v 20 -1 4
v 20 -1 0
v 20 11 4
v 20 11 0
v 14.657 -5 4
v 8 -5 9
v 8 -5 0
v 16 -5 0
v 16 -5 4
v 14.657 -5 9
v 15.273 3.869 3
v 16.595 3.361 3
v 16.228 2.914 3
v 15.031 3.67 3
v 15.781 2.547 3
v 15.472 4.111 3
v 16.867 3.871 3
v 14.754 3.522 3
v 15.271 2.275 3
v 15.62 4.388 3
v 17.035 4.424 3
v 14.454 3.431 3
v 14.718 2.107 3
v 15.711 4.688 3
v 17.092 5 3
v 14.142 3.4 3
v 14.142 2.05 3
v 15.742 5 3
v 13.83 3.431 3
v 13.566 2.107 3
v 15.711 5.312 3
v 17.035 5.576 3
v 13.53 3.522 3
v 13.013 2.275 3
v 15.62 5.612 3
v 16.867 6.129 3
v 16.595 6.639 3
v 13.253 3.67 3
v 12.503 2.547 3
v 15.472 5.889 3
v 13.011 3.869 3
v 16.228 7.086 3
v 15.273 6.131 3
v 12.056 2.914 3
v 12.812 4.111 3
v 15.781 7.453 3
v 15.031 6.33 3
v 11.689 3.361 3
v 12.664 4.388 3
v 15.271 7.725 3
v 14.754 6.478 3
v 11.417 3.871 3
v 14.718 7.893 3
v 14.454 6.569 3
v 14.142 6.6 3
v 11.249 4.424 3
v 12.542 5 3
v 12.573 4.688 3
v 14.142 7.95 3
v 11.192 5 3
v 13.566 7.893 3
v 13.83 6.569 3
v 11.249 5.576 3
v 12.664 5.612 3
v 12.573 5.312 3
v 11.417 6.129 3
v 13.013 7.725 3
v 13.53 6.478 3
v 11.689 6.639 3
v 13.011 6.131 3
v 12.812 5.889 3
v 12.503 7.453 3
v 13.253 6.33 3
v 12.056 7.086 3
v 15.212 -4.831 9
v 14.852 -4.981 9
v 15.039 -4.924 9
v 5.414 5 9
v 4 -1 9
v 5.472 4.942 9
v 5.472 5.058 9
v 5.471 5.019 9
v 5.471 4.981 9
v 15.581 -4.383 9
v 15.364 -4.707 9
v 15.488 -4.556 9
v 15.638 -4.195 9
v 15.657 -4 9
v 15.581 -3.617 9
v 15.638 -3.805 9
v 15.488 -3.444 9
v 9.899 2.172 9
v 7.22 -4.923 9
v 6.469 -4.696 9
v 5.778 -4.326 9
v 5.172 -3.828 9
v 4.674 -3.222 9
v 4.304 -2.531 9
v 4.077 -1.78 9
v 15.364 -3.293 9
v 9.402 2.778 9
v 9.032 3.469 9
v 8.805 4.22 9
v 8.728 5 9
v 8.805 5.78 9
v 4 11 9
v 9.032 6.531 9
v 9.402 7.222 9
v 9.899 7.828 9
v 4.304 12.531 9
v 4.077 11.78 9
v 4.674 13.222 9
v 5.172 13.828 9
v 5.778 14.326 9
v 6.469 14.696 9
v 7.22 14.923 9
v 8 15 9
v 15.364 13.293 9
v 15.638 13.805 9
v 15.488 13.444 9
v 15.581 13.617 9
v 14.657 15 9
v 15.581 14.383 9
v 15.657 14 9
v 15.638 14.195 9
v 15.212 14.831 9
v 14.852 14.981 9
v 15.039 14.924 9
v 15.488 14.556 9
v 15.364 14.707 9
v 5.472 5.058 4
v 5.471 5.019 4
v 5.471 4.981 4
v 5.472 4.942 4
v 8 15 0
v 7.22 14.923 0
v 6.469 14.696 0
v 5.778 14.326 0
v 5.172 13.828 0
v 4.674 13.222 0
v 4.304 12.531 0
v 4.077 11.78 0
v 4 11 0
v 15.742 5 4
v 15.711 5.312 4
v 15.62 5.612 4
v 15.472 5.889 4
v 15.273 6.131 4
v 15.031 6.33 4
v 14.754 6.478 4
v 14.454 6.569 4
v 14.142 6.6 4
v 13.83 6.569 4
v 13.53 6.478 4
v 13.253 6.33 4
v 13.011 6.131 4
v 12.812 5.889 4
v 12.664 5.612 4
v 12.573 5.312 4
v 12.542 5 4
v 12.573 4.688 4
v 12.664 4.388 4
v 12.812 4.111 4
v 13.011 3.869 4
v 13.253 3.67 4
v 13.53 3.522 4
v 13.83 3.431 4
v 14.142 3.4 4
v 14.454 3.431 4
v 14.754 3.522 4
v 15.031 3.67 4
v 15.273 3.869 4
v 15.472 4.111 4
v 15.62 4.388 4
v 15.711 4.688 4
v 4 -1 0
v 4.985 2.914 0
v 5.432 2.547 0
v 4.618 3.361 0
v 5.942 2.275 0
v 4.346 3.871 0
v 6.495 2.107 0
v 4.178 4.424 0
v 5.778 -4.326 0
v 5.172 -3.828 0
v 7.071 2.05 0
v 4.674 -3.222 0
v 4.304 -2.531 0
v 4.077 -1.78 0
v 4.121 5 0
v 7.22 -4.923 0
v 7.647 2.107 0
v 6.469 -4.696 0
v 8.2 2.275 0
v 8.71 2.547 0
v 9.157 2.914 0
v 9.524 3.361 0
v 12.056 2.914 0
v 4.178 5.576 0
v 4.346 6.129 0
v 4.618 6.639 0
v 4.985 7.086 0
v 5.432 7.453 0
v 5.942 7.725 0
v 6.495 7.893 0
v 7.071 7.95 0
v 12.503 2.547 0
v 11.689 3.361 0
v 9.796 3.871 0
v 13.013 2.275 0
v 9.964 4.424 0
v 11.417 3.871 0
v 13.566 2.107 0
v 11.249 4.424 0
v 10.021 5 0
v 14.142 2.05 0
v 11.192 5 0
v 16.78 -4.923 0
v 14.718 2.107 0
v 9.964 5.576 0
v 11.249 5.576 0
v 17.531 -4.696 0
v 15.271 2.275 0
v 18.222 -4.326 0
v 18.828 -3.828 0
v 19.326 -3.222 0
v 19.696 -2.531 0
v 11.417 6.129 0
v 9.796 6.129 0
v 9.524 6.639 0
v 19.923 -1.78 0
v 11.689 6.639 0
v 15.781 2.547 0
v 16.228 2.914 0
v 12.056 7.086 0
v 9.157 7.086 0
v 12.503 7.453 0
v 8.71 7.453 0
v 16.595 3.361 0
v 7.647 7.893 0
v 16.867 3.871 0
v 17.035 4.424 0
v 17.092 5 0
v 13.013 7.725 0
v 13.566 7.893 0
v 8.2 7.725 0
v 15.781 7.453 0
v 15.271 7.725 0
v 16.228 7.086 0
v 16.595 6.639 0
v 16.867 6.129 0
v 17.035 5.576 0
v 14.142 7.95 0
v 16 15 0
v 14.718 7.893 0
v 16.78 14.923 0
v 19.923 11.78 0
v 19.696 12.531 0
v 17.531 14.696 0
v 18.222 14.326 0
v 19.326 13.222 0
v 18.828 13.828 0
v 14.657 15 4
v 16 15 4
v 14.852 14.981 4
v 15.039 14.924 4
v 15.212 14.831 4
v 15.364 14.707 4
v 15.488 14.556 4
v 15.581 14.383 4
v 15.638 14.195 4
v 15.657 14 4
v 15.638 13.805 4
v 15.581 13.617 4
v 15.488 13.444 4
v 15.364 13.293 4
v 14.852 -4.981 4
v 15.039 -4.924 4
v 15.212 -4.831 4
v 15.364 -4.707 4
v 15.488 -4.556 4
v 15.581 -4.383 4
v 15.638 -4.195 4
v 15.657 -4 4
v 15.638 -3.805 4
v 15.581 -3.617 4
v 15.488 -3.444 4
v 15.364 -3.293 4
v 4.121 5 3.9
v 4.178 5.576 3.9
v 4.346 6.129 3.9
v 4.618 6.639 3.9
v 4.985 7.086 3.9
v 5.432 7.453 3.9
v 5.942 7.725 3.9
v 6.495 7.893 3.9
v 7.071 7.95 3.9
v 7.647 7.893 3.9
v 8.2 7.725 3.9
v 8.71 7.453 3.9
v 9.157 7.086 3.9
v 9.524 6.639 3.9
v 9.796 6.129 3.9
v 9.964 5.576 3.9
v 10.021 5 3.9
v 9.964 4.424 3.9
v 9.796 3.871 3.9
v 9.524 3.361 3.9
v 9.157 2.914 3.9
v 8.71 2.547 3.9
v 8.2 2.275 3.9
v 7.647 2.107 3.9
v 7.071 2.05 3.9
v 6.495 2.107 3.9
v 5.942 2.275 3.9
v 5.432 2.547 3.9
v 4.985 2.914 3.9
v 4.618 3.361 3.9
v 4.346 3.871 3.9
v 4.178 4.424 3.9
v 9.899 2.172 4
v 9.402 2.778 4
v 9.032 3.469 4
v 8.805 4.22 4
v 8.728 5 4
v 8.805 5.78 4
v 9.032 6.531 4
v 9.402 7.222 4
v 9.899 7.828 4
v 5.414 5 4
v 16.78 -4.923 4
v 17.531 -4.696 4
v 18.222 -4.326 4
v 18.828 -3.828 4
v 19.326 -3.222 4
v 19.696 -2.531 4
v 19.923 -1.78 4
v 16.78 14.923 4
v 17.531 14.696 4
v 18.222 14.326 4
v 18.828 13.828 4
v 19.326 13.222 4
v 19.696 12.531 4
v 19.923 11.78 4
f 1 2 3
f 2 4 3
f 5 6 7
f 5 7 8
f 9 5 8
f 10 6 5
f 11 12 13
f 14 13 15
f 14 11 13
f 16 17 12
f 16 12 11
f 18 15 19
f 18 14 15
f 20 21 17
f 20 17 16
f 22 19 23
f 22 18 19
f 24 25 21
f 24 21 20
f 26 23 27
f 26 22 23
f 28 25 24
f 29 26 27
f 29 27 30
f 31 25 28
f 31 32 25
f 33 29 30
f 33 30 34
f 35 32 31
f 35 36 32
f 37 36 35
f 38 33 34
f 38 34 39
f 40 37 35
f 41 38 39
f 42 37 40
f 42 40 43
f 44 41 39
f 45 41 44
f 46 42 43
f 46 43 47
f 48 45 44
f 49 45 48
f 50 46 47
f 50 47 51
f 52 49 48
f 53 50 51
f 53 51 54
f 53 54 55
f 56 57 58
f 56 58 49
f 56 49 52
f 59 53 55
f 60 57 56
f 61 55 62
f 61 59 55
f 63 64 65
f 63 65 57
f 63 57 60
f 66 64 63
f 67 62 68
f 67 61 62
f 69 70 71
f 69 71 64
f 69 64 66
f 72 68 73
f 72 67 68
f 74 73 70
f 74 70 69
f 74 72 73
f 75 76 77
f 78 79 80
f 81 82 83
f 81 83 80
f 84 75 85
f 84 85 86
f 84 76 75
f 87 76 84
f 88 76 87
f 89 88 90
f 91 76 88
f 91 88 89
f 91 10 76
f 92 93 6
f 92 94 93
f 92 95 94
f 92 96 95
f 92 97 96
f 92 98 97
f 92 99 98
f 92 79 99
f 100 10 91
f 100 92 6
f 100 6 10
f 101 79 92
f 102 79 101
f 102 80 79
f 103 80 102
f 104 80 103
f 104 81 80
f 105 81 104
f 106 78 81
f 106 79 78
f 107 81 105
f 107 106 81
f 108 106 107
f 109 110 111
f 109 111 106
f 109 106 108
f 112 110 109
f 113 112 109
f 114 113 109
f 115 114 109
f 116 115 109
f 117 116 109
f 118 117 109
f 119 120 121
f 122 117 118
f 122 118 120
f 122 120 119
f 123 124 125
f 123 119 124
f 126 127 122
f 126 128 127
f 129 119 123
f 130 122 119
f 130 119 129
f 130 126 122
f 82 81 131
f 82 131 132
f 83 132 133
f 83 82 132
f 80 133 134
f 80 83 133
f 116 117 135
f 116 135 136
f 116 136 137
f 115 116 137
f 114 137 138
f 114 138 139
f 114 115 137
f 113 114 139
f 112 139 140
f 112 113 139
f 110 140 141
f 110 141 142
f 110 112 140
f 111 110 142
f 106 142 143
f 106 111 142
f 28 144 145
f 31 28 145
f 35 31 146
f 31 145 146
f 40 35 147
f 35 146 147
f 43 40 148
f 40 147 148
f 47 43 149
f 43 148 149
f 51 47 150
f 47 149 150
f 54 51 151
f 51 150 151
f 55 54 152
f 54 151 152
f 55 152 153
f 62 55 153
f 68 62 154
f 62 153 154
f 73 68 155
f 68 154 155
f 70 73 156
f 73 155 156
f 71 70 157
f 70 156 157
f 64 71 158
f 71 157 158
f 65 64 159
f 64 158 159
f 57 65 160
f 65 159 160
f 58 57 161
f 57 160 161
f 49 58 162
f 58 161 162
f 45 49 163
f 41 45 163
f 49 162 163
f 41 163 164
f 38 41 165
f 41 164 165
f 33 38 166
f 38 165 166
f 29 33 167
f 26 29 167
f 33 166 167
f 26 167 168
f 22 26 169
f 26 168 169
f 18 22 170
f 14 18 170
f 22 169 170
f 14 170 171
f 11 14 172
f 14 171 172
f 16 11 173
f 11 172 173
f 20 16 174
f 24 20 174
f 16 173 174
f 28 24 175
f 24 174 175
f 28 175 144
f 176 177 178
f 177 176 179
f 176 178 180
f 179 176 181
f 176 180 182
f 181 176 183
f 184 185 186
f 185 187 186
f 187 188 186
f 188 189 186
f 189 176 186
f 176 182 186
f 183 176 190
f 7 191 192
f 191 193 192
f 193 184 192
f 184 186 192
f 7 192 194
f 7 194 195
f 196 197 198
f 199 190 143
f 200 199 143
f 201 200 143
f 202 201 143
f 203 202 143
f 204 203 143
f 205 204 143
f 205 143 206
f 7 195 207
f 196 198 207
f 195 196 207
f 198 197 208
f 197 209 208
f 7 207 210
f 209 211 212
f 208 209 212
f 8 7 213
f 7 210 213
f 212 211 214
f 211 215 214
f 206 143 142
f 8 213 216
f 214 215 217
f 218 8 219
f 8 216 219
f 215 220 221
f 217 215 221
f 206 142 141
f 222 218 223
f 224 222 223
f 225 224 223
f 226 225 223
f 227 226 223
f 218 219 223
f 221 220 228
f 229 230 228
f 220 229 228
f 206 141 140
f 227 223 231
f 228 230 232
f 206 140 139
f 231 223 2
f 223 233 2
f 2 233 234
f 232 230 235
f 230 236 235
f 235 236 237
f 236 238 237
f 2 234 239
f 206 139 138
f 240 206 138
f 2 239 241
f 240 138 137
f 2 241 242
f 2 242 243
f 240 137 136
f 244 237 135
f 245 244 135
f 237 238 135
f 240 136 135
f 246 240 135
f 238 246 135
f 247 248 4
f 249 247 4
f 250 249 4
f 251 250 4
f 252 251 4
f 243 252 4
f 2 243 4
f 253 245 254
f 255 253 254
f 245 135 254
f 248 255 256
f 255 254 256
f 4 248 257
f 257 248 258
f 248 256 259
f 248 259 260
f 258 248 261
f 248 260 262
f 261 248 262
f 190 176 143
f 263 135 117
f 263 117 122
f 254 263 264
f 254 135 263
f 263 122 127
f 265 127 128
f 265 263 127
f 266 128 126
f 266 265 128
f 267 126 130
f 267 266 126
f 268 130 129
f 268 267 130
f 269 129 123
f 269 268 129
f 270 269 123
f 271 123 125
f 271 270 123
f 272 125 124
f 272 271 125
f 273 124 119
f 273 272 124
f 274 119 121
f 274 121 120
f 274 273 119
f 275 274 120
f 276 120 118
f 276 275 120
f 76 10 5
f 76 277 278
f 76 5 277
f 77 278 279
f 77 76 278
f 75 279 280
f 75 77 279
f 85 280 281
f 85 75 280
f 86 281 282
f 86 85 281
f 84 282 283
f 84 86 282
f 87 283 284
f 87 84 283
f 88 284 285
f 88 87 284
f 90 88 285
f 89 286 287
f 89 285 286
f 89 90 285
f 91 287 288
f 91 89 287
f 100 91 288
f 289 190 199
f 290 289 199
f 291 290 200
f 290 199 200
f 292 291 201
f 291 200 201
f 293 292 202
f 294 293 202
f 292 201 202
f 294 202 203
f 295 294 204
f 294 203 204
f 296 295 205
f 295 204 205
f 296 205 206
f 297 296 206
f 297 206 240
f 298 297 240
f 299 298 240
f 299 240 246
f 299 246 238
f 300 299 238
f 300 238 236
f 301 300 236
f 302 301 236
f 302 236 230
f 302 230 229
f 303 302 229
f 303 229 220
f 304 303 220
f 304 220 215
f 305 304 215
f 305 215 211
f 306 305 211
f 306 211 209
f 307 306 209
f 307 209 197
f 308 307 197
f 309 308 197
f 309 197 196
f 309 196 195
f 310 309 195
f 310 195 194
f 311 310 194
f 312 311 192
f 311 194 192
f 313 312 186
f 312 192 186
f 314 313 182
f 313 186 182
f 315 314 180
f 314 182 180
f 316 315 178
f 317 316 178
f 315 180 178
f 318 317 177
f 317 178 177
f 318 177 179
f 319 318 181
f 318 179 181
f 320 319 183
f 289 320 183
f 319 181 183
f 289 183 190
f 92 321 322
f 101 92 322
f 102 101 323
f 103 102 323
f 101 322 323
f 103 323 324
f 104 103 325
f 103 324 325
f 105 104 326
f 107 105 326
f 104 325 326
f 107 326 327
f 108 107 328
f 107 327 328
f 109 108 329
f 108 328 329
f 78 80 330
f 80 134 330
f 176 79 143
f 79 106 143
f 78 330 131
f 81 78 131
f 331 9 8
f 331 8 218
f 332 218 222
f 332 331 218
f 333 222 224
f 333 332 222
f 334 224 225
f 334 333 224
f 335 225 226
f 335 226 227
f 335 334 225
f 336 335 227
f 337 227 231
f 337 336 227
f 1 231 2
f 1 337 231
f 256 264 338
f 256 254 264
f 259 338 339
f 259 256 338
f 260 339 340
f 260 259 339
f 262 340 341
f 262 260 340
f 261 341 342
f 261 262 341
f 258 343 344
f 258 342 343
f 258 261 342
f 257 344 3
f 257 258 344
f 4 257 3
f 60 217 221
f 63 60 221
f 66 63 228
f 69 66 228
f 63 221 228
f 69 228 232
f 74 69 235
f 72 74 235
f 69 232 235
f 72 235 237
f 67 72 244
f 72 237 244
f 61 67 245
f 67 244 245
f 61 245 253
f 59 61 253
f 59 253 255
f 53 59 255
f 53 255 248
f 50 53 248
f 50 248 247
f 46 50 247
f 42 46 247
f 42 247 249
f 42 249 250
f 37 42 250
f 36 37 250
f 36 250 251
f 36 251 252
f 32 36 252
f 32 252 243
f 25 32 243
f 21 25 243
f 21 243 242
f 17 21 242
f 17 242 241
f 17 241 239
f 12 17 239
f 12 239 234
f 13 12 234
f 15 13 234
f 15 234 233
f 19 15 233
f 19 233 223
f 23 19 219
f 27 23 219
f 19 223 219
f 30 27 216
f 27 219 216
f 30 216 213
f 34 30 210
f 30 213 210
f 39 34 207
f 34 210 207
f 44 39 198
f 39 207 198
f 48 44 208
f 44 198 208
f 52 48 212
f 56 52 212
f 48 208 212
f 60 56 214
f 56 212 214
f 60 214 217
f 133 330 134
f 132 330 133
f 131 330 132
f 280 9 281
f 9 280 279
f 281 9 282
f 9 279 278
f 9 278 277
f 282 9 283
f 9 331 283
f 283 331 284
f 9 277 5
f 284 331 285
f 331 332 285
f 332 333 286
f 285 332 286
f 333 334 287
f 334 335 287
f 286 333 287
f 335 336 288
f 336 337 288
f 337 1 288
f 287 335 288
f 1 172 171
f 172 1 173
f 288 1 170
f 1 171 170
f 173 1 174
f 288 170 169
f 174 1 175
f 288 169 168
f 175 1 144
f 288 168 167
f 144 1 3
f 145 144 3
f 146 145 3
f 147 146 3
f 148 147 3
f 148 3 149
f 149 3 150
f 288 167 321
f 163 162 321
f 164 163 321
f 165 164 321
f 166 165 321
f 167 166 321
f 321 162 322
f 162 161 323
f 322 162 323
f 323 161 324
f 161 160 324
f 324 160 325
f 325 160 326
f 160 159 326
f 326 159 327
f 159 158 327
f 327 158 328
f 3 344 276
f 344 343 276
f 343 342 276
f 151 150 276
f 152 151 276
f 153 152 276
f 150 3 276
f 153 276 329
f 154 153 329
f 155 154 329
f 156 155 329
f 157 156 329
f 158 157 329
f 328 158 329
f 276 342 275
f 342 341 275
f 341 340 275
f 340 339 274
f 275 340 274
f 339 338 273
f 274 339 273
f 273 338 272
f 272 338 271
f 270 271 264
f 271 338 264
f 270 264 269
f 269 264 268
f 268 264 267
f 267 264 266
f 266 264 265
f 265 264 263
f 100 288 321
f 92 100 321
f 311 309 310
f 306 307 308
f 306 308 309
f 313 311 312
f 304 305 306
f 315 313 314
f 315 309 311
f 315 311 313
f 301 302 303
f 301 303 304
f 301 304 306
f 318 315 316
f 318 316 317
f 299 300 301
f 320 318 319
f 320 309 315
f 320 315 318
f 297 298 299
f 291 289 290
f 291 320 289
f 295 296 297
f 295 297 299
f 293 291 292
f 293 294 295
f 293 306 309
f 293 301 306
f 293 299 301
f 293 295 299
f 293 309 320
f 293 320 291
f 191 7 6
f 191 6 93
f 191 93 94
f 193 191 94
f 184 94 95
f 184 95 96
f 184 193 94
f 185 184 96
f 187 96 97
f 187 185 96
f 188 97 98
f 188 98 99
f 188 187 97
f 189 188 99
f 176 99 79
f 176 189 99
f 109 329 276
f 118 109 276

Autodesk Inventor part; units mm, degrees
ref_plane "YZ Plane" through (0, 0, 0) normal (1, 0, 0) x (0, 1, 0)
ref_plane "XZ Plane" through (0, 0, 0) normal (0, 1, 0) x (-1, 0, 0)
ref_plane "XY Plane" through (0, 0, 0) normal (0, 0, 1) x (1, 0, 0)
sketch "Sketch1" plane through (0, 0, 0) normal (0, 0, 1) x (1, 0, 0)
  line L0 (0, 0) -> (20, 0)
  line L1 (20, 0) -> (20, 10)
  line L2 (20, 10) -> (0, 10)
  line L3 (0, 10) -> (0, 0)
  dimension "d0" = 20
  dimension "d1" = 10
sketch "Sketch1 outline for Extrusion1" plane through (0, 0, 0) normal (0, 0, 1) x (1, 0, 0)
  line L0 (0, 0) -> (20, 0)
  line L1 (0, 10) -> (0, 0)
  line L2 (20, 10) -> (0, 10)
  line L3 (20, 0) -> (20, 10)
extrude "Extrusion1" add sketch "Sketch1 outline for Extrusion1" along normal blind 4
sketch "Sketch2" plane through (0, 0, 4) normal (0, 0, 1) x (1, 0, 0)
  line L0 (0, 10) -> (0, 0) projected
  line L1 (0, 5) -> (7.071, 5)
  line L2 (7.071, 5) -> (14.142, 5)
  circle A0 centre (7.071, 5) radius 1.6
  circle A1 centre (14.142, 5) radius 2.95
  dimension "d4" = 7.071
  dimension "d5" = 7.071
  dimension "d6" = 3.2
  dimension "d7" = 5.9
sketch "Sketch2 outline for Extrusion2" plane through (0, 0, 4) normal (0, 0, 1) x (1, 0, 0)
  circle A0 centre (7.071, 5) radius 1.6
extrude "Extrusion2" cut sketch "Sketch2 outline for Extrusion2" against normal blind 4
sketch "Sketch3" plane through (0, 0, 4) normal (0, 0, 1) x (1, 0, 0)
  circle A0 centre (7.071, 5) radius 1.6 projected
  line L0 (7.071, 5) -> (14.142, 5)
  circle A1 centre (14.142, 5) radius 1.6
  point P0 (0, 0)
  dimension "d10" = 7.071
  dimension "d11" = 3.2
sketch "Sketch3 outline for Extrusion3" plane through (0, 0, 4) normal (0, 0, 1) x (1, 0, 0)
  circle A0 centre (14.142, 5) radius 1.6
extrude "Extrusion3" cut sketch "Sketch3 outline for Extrusion3" against normal blind 3
sketch "Sketch5" plane through (0, 0, 4) normal (0, 0, 1) x (1, 0, 0)
  line L0 (0, 0) -> (20, 0) projected
  line L1 (0, 10) -> (4, 10)
  line L2 (4, 10) -> (4, 0)
  line L3 (4, 0) -> (0, 0)
  line L4 (0, 0) -> (0, 10)
  dimension "d17" = 4
sketch "Sketch5 outline for Extrusion5" plane through (0, 0, 4) normal (0, 0, 1) x (1, 0, 0)
  line L0 (4, 10) -> (0, 10)
  line L1 (4, 0) -> (4, 10)
  line L2 (0, 0) -> (4, 0)
  line L3 (0, 10) -> (0, 0)
extrude "Extrusion5" cut sketch "Sketch5 outline for Extrusion5" against normal blind 4
sketch "Sketch6" plane through (0, 0, 4) normal (0, 0, 1) x (1, 0, 0)
  circle A0 centre (7.071, 5) radius 1.6
  line L0 (7.071, 5) -> (9.899427, 7.828427)
  line L1 (7.071, 5) -> (11.071, 5) construction
  line L2 (20, 10) -> (4, 10)
  line L3 (4, 0) -> (20, 0)
  line L4 (7.071, 5) -> (5.414, 5)
  line L5 (5.414, 5) -> (8.242427, 7.828427)
  line L6 (5.414, 5) -> (9.414, 5) construction
  line L7 (5.414, 5) -> (10.414, 0)
  line L8 (5.414, 5) -> (12.485068, 5) construction
  arc A1 (8.242427, 7.828427) -> (8.242427, 2.171573) centre (11.070854, 5) ccw
  circle A2 centre (7.071, 5) radius 1.6
  line L9 (20, 10) -> (4, 10)
  arc A3 (8.914, 10) -> (10.414, 0) centre (9.664, 5) ccw
  line L10 (8.914, 10) -> (4, 10)
  line L11 (4, 10) -> (4, 0)
  line L12 (4, 0) -> (8.914, 0)
  line L13 (8.914, 0) -> (8.914, 10)
  line L14 (7.071, 5) -> (12.071, 0)
  line L15 (4, 0) -> (20, 0)
  line L16 (7.071, 5) -> (14.142068, 5) construction
  line L17 (9.899427, 7.828427) -> (12.071, 10)
  arc A4 (9.899427, 7.828427) -> (9.899427, 2.171573) centre (12.727854, 5) ccw
  line L18 (8.242427, 7.828427) -> (10.414, 10)
  point P0 (0, 0)
  point P1 (13.001674, 10)
  point P2 (10.571, 0)
  point P3 (9.364849, 1.723072)
  point P4 (8.914, 10)
  point P5 (8.914, 0)
  point P6 (7.390866, 3.432299)
  point P7 (5.472054, 4.941946)
  point P8 (5.472054, 5.058054)
  point P9 (7.390866, 6.567701)
  point P10 (7.012946, 3.401054)
  point P11 (8.914, 1.5)
  point P12 (8.914, 0)
  point P13 (8.914, 10)
  point P14 (8.914, 8.5)
  dimension "d21" = 4
  dimension "d22" = 45
  dimension "d24" = 1.657
  dimension "d25" = 45
  dimension "d26" = 45
  dimension "d27" = 4
  dimension "d35" = 45
  dimension "d36" = 4
sketch "Sketch6 outline for Extrusion6" plane through (0, 0, 4) normal (0, 0, 1) x (1, 0, 0)
  line L0 (5.472054, 4.941946) -> (5.414, 5)
  line L1 (5.414, 5) -> (5.472054, 5.058054)
  arc A0 (5.472054, 5.058054) -> (5.472054, 4.941946) centre (7.071, 5) cw
  line L2 (12.071, 10) -> (4, 10)
  line L3 (4, 10) -> (4, 0)
  line L4 (4, 0) -> (12.071, 0)
  line L5 (12.071, 0) -> (9.899427, 2.171573)
  arc A1 (9.899427, 2.171573) -> (9.899427, 7.828427) centre (12.727854, 5) cw
  line L6 (9.899427, 7.828427) -> (12.071, 10)
extrude "Extrusion6" add sketch "Sketch6 outline for Extrusion6" along normal blind 5
sketch "Sketch8" plane through (0, 0, 0) normal (0, 0, -1) x (-1, 0, 0)
  circle A0 centre (-14.142, 5) radius 1.6 projected
  circle A1 centre (-14.142, 5) radius 2.95
  point P0 (0, 0)
  dimension "d37" = 5.9
sketch "Sketch8 outline for Extrusion8" plane through (0, 0, 0) normal (0, 0, -1) x (-1, 0, 0)
  circle A0 centre (-14.142, 5) radius 2.95
extrude "Extrusion8" cut sketch "Sketch8 outline for Extrusion8" against normal blind 3
sketch "Sketch9" plane through (0, 0, 0) normal (0, 0, -1) x (-1, 0, 0)
  arc A0 (-5.472054, 5.058054) -> (-5.472054, 4.941946) centre (-7.071, 5) ccw
  circle A1 centre (-7.071, 5) radius 2.95
  point P0 (0, 0)
  dimension "d40" = 5.9
sketch "Sketch9 outline for Extrusion9" plane through (0, 0, 0) normal (0, 0, -1) x (-1, 0, 0)
  circle A0 centre (-7.071, 5) radius 2.95
extrude "Extrusion9" cut sketch "Sketch9 outline for Extrusion9" against normal blind 3.9
sketch "Sketch10" plane through (0, 0, 9) normal (0, 0, 1) x (1, 0, 0)
  arc A0 (5.472054, 4.941946) -> (5.472054, 5.058054) centre (7.071, 5) ccw
  circle A1 centre (7.071, 5) radius 1.6
  point P0 (0, 0)
  point P1 (5.472054, 5.058054)
sketch "Sketch10 outline for Extrusion10" plane through (0, 0, 9) normal (0, 0, 1) x (1, 0, 0)
  arc A0 (5.472054, 5.058054) -> (5.472054, 4.941946) centre (7.071, 5) ccw
  arc A1 (5.472054, 4.941946) -> (5.472054, 5.058054) centre (7.071, 5) ccw
extrude "Extrusion10" add sketch "Sketch10 outline for Extrusion10" against normal blind 5.1
sketch "Sketch11" plane through (12.071, 10, 9) normal (0, 1, 0) x (1, 0, 0)
  line L0 (-8.071, 0) -> (-8.071, 9) projected
  line L1 (7.929, 9) -> (7.929, 5) projected
  line L2 (-8.071, 9) -> (7.929, 9)
  line L3 (7.929, 9) -> (7.929, 5)
  line L4 (7.929, 5) -> (-8.071, 5)
  line L5 (-8.071, 5) -> (-8.071, 9)
  point P0 (-12.071, 9)
sketch "Sketch11 outline for Extrusion11" plane through (12.071, 10, 9) normal (0, 1, 0) x (1, 0, 0)
  line L0 (7.929, 9) -> (-8.071, 9)
  line L1 (7.929, 5) -> (7.929, 9)
  line L2 (-8.071, 5) -> (7.929, 5)
  line L3 (-8.071, 9) -> (-8.071, 5)
extrude "Extrusion11" add sketch "Sketch11 outline for Extrusion11" along normal blind 5
sketch "Sketch12" plane through (20, 0, 0) normal (0, -1, 0) x (1, 0, 0)
  line L0 (0, 4) -> (0, 0) projected
  line L1 (-7.929, 4) -> (-16, 4) projected
  line L2 (0, 0) -> (-16, 0)
  line L3 (-16, 0) -> (-16, 4)
  line L4 (-16, 4) -> (0, 4)
  line L5 (0, 4) -> (0, 0)
  point P0 (-20, 0)
sketch "Sketch12 outline for Extrusion12" plane through (20, 0, 0) normal (0, -1, 0) x (1, 0, 0)
  line L0 (-16, 4) -> (-16, 0)
  line L1 (-7.929, 4) -> (-16, 4)
  line L2 (0, 4) -> (-7.929, 4)
  line L3 (0, 0) -> (0, 4)
  line L4 (-16, 0) -> (0, 0)
extrude "Extrusion12" add sketch "Sketch12 outline for Extrusion12" along normal blind 5
sketch "Sketch13" plane through (0, 0, 4) normal (0, 0, 1) x (1, 0, 0)
  line L0 (9.899427, 2.171573) -> (12.071, 0)
  line L1 (12.071, 10) -> (9.899427, 7.828427)
  line L2 (12.071, 10) -> (17.071, 15)
  line L3 (20, 15) -> (4, 15)
  line L4 (12.071, 10) -> (19.142068, 10) construction
  line L5 (20, 15) -> (20, -5)
  line L6 (12.071, 10) -> (4, 10)
  line L7 (4, 10) -> (17.071, 10)
  line L8 (17.071, 10) -> (17.071, 15)
  line L9 (17.071, 15) -> (4, 15)
  line L10 (4, 15) -> (4, 10)
  line L11 (12.071, 0) -> (17.071, -5)
  line L12 (12.071, 0) -> (19.142068, 0) construction
  line L13 (4, 0) -> (12.071, 0)
  line L14 (4, 0) -> (20, 0)
  line L15 (20, 0) -> (20, -5)
  line L16 (20, -5) -> (4, -5)
  line L17 (4, -5) -> (4, 0)
  dimension "d50" = 45
  dimension "d51" = 45
sketch "Sketch13 outline for Extrusion13" plane through (0, 0, 4) normal (0, 0, 1) x (1, 0, 0)
  line L0 (4, 15) -> (4, 10)
  line L1 (17.071, 15) -> (4, 15)
  line L2 (12.071, 10) -> (17.071, 15)
  line L3 (4, 10) -> (12.071, 10)
  line L4 (4, 0) -> (4, -5)
  line L5 (12.071, 0) -> (4, 0)
  line L6 (17.071, -5) -> (12.071, 0)
  line L7 (4, -5) -> (17.071, -5)
extrude "Extrusion13" add sketch "Sketch13 outline for Extrusion13" along normal blind 5
fillet "Fillet2" radius 4 4 edges at (20, 15, 2) (4, 15, 4.5) (20, -5, 2) (4, -5, 4.5)
fillet "Fillet3" radius 1 2 edges at (16.9553, 14.8843, 6.5) (16.9553, -4.8843, 6.5)
properties part number "corner fitter"
